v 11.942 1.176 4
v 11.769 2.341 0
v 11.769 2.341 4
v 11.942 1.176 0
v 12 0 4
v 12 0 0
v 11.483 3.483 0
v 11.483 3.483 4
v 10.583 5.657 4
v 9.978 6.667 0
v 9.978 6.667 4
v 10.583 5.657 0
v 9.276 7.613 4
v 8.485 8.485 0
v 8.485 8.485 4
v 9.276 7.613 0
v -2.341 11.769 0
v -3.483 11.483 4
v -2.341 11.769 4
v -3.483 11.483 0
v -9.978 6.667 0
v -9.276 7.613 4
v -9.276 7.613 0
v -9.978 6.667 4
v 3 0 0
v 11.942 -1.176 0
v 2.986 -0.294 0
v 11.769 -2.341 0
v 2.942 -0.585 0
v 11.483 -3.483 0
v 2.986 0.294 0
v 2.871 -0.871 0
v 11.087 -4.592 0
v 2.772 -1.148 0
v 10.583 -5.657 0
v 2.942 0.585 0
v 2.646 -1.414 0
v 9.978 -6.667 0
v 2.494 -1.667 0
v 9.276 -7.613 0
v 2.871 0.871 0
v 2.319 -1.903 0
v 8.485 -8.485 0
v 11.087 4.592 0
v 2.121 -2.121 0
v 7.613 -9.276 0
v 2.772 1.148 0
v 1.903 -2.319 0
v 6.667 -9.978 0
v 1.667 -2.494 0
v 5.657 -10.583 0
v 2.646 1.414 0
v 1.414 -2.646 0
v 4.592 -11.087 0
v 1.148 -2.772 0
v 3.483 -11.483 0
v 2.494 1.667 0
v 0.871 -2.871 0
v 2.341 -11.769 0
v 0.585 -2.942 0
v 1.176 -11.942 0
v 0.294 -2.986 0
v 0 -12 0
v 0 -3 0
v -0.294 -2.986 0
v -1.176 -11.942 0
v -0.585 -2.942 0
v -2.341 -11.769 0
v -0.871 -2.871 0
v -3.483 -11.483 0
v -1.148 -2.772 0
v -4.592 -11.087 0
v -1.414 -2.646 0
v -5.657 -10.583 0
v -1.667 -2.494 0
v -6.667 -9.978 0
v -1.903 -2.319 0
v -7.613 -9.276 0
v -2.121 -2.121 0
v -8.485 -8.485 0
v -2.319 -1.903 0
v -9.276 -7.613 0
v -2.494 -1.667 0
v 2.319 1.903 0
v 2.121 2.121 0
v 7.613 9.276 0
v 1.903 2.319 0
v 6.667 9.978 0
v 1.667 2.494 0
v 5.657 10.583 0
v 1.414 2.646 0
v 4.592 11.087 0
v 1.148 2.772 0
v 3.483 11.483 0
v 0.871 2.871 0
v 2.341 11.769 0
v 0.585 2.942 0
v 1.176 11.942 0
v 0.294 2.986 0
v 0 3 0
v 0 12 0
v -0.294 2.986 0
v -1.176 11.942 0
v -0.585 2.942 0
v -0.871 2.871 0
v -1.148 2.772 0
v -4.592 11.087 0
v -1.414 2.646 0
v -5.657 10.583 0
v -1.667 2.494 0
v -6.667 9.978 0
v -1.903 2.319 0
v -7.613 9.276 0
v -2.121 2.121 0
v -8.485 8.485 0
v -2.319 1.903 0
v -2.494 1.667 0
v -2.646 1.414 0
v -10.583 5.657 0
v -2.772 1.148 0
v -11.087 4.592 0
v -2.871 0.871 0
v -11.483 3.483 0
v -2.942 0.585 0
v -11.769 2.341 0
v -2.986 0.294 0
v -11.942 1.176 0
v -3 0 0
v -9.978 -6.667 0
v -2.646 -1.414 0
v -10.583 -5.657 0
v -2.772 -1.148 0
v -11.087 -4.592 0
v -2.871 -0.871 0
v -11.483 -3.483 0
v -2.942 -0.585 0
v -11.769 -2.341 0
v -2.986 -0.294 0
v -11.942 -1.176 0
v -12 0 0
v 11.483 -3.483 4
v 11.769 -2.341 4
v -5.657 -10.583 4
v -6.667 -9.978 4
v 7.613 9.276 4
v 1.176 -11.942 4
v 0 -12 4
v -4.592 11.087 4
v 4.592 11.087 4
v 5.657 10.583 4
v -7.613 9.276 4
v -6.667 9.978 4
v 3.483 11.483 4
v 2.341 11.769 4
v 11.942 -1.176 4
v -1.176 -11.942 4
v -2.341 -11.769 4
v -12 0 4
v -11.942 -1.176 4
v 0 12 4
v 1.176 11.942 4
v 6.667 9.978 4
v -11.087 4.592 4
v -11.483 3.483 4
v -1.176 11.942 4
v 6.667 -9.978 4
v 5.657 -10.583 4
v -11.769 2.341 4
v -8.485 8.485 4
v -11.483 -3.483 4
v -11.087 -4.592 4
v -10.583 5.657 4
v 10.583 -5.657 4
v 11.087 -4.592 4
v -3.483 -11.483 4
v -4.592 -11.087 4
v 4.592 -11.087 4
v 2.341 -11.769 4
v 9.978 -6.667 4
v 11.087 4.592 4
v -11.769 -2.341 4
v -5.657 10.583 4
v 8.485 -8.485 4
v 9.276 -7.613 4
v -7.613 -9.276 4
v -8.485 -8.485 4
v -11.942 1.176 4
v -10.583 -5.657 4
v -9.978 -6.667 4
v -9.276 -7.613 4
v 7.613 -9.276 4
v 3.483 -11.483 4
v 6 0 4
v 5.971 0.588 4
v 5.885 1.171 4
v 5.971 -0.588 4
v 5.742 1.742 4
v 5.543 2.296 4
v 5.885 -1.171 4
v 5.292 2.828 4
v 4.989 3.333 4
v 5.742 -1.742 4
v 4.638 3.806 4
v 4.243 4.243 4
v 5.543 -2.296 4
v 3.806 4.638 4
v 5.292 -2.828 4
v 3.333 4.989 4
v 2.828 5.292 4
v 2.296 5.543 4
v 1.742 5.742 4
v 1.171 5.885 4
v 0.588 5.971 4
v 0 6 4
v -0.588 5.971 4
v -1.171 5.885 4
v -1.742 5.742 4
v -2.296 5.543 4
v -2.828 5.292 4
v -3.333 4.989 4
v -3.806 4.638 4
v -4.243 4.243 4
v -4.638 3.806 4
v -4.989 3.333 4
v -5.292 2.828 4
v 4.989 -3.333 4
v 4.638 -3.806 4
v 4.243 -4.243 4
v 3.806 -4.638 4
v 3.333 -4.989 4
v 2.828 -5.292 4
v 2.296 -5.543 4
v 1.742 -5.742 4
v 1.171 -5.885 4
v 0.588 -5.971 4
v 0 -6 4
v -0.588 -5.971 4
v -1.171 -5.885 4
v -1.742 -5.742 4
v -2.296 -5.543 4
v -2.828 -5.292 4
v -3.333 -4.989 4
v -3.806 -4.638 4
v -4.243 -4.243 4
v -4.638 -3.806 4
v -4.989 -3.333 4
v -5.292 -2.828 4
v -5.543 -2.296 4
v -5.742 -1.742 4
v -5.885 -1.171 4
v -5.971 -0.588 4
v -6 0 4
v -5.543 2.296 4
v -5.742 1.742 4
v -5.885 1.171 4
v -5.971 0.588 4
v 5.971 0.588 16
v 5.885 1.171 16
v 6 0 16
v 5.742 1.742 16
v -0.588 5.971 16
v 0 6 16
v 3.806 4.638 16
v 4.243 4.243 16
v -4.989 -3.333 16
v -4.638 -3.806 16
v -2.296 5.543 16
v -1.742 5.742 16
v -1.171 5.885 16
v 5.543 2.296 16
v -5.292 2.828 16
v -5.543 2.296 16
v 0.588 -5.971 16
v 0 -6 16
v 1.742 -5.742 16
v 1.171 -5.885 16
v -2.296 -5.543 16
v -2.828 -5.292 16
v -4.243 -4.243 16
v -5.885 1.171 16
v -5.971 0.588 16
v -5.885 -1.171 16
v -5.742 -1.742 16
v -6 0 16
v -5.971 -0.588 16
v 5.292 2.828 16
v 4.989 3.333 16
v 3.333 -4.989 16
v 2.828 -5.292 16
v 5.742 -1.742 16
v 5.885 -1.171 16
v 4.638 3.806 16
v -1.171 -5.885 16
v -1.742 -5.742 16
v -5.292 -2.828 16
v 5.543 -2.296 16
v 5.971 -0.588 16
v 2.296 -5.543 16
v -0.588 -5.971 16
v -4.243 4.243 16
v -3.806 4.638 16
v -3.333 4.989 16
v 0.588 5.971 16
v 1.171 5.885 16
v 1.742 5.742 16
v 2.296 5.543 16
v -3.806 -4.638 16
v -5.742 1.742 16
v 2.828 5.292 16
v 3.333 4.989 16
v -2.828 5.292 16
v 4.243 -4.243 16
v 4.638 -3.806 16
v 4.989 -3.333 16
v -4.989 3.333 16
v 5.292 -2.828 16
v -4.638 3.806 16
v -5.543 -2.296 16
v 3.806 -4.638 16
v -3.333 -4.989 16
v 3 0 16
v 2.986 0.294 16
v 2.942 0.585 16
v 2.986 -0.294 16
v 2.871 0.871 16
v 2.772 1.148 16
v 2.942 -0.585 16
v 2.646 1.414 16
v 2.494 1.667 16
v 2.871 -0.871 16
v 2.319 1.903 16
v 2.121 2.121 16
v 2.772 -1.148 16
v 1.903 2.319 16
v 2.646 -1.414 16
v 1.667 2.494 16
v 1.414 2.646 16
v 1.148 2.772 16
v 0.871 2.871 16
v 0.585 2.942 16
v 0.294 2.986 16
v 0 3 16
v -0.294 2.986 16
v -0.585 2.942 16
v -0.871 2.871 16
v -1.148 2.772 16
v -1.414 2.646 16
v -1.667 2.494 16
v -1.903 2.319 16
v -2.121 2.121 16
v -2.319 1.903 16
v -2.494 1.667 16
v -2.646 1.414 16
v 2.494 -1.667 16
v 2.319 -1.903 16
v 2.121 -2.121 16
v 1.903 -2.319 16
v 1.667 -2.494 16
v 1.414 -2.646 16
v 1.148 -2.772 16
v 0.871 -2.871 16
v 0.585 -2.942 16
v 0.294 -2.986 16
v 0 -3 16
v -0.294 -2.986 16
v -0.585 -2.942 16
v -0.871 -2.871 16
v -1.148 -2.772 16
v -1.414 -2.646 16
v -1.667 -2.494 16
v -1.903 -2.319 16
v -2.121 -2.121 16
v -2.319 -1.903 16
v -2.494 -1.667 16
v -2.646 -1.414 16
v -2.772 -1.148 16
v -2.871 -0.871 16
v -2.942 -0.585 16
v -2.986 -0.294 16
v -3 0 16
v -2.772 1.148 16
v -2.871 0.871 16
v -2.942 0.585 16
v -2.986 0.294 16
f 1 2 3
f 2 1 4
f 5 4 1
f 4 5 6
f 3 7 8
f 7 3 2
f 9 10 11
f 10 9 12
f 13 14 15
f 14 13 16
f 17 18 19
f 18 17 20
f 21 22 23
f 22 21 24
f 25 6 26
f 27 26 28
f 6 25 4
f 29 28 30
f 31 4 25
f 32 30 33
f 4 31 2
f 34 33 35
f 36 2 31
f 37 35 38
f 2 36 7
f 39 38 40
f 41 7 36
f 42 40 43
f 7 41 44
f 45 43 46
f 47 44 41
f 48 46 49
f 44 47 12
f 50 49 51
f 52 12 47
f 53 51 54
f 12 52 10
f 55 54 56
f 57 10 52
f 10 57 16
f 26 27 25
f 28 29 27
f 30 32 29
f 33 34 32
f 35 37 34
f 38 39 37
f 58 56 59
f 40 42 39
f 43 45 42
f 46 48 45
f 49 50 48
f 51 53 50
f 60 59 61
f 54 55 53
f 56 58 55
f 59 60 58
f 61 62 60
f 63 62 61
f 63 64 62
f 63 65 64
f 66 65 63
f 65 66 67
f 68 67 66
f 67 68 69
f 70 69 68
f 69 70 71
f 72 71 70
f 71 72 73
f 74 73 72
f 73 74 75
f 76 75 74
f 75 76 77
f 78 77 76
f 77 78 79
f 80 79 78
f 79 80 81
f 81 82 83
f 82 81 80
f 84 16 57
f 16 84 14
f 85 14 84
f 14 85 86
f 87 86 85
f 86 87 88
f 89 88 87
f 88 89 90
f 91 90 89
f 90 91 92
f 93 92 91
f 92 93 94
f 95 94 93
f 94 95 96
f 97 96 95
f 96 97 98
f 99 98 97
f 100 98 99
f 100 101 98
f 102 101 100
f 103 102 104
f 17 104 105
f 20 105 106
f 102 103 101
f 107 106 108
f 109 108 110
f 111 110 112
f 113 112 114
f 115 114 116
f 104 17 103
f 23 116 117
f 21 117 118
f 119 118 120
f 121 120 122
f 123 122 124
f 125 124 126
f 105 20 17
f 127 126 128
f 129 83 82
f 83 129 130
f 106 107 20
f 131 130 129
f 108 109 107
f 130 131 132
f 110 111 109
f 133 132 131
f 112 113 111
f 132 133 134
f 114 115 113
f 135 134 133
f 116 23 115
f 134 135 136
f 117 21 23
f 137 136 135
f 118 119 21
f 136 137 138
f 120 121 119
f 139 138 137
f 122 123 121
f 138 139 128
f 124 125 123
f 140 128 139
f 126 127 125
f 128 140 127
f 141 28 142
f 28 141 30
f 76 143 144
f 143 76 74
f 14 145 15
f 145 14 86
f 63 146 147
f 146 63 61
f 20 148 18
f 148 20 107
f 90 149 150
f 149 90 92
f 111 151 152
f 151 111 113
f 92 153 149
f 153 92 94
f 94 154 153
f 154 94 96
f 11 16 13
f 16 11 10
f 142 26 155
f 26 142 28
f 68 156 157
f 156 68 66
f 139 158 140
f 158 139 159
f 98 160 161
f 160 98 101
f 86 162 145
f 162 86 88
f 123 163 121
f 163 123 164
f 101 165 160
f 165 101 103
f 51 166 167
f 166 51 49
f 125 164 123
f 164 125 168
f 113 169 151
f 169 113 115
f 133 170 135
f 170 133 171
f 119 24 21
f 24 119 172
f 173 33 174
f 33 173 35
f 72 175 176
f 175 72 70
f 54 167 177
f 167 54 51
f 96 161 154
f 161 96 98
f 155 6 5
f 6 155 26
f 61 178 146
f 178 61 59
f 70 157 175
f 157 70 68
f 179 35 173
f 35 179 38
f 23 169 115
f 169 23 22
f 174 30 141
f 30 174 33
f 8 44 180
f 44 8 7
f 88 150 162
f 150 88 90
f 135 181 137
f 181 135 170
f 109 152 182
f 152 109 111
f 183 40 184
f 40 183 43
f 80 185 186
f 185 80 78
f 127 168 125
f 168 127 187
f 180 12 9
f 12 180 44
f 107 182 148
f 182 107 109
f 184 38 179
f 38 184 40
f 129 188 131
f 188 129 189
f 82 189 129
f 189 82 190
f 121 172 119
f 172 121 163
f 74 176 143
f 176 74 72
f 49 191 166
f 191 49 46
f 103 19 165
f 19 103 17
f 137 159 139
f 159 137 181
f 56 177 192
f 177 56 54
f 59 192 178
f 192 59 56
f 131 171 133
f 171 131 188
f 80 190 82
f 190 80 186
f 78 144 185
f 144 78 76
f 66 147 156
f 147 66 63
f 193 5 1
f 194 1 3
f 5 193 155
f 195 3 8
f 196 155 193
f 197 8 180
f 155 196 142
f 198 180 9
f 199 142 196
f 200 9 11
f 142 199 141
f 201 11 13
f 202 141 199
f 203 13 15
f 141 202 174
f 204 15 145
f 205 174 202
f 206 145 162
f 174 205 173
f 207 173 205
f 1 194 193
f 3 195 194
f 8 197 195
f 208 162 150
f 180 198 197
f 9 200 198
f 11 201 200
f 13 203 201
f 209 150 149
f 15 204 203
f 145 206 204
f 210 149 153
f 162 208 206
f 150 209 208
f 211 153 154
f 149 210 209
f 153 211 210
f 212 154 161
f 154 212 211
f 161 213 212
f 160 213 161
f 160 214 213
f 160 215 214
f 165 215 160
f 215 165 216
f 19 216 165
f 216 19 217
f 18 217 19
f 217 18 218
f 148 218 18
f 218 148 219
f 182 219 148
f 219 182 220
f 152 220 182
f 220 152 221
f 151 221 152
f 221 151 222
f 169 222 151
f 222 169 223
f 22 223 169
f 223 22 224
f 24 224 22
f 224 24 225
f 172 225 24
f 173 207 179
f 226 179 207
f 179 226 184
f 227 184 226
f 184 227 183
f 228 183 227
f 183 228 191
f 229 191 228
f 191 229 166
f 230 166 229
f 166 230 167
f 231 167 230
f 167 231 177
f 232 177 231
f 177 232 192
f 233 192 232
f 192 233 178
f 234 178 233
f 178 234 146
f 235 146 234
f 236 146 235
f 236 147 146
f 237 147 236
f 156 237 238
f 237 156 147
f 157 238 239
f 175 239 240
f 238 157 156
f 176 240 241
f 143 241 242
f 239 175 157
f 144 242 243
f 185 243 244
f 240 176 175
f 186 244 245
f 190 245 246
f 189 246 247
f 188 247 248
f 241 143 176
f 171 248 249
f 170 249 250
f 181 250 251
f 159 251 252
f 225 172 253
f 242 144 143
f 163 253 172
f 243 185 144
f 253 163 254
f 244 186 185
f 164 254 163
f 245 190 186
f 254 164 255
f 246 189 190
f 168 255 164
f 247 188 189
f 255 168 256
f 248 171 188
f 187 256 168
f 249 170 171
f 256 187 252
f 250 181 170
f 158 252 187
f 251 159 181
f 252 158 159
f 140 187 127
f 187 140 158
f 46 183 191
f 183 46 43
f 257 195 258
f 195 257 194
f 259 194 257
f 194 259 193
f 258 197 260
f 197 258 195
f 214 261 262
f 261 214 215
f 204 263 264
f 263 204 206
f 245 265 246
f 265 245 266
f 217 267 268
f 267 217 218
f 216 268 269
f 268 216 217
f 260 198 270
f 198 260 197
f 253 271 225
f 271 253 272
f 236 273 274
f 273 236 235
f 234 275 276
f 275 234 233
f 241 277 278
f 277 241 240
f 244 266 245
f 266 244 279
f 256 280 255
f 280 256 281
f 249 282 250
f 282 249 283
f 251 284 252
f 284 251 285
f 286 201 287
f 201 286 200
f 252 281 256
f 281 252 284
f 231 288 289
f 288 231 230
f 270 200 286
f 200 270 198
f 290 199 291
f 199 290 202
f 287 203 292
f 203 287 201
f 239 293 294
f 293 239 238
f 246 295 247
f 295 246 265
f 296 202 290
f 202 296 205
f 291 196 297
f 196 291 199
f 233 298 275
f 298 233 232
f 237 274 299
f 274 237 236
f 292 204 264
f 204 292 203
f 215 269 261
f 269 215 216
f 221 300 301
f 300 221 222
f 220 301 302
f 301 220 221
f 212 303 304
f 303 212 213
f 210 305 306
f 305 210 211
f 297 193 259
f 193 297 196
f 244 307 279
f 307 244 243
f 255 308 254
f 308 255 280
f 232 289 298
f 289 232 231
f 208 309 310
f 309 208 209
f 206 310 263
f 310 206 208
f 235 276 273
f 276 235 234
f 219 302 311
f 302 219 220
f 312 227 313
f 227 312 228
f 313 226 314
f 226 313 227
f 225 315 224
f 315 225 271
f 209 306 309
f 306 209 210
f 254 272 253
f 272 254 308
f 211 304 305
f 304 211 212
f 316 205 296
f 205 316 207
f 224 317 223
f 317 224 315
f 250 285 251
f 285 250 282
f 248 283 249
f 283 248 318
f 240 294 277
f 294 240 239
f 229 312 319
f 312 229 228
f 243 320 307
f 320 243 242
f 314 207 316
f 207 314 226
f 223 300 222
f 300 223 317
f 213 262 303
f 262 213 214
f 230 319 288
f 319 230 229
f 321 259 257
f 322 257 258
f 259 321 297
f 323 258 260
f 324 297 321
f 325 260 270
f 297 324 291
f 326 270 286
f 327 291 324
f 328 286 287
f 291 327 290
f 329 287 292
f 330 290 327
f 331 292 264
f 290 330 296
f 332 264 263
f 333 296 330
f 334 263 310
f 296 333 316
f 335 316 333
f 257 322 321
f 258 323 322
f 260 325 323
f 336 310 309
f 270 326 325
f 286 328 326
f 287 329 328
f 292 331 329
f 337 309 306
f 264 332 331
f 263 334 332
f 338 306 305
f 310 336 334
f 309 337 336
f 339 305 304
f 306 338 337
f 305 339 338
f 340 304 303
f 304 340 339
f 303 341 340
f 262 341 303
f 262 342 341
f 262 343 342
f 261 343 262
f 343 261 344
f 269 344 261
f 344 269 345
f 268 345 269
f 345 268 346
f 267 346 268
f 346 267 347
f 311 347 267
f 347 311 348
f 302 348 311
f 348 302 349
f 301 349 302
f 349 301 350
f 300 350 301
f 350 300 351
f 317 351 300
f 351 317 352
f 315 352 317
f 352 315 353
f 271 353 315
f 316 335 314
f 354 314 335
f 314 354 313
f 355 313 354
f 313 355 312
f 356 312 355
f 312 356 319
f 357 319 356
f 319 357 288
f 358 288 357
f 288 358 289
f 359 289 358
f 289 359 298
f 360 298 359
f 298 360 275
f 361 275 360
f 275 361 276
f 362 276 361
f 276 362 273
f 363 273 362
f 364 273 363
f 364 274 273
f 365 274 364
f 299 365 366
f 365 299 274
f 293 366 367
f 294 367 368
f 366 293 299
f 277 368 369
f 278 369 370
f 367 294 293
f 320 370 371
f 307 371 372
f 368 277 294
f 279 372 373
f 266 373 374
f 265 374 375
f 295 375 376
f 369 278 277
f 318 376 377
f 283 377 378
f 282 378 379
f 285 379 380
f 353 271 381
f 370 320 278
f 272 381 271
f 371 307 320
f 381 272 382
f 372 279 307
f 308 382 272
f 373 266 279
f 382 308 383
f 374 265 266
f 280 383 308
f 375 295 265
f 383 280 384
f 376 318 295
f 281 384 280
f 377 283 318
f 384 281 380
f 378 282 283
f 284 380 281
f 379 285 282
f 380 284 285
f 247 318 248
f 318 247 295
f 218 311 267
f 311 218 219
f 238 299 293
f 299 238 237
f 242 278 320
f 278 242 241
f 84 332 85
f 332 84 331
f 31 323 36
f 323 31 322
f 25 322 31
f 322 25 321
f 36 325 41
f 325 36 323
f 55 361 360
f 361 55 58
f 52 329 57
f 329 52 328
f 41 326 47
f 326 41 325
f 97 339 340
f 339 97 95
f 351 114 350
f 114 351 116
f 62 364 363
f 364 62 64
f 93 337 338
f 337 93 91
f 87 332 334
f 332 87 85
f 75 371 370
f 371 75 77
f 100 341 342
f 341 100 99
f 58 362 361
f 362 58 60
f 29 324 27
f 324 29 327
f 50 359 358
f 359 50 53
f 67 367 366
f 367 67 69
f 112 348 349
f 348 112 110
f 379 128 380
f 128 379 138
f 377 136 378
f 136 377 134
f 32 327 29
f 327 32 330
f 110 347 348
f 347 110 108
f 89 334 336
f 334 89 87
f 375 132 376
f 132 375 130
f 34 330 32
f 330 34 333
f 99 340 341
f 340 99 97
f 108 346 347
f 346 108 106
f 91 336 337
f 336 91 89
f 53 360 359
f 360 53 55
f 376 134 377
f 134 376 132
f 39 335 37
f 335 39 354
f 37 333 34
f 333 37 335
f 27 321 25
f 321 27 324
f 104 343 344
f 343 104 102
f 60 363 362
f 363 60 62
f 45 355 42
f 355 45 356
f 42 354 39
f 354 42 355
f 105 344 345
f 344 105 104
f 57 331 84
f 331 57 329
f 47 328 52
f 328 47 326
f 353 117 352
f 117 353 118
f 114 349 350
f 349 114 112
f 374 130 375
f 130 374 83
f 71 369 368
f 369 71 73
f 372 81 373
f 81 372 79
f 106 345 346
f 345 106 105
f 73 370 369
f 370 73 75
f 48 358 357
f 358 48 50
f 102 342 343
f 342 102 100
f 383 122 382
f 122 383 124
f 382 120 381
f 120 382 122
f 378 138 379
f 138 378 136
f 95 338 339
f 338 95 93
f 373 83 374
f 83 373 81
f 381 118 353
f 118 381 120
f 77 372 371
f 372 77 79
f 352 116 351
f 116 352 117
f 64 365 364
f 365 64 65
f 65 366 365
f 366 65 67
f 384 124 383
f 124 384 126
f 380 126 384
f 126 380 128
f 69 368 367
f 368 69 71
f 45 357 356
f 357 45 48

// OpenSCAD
$fn = 64;
difference() {
  union() {
    cylinder(h = 4, d = 24);
    cylinder(h = 16, d = 12);
  }
  translate([0, 0, -1]) cylinder(h = 18, d = 6);
}
